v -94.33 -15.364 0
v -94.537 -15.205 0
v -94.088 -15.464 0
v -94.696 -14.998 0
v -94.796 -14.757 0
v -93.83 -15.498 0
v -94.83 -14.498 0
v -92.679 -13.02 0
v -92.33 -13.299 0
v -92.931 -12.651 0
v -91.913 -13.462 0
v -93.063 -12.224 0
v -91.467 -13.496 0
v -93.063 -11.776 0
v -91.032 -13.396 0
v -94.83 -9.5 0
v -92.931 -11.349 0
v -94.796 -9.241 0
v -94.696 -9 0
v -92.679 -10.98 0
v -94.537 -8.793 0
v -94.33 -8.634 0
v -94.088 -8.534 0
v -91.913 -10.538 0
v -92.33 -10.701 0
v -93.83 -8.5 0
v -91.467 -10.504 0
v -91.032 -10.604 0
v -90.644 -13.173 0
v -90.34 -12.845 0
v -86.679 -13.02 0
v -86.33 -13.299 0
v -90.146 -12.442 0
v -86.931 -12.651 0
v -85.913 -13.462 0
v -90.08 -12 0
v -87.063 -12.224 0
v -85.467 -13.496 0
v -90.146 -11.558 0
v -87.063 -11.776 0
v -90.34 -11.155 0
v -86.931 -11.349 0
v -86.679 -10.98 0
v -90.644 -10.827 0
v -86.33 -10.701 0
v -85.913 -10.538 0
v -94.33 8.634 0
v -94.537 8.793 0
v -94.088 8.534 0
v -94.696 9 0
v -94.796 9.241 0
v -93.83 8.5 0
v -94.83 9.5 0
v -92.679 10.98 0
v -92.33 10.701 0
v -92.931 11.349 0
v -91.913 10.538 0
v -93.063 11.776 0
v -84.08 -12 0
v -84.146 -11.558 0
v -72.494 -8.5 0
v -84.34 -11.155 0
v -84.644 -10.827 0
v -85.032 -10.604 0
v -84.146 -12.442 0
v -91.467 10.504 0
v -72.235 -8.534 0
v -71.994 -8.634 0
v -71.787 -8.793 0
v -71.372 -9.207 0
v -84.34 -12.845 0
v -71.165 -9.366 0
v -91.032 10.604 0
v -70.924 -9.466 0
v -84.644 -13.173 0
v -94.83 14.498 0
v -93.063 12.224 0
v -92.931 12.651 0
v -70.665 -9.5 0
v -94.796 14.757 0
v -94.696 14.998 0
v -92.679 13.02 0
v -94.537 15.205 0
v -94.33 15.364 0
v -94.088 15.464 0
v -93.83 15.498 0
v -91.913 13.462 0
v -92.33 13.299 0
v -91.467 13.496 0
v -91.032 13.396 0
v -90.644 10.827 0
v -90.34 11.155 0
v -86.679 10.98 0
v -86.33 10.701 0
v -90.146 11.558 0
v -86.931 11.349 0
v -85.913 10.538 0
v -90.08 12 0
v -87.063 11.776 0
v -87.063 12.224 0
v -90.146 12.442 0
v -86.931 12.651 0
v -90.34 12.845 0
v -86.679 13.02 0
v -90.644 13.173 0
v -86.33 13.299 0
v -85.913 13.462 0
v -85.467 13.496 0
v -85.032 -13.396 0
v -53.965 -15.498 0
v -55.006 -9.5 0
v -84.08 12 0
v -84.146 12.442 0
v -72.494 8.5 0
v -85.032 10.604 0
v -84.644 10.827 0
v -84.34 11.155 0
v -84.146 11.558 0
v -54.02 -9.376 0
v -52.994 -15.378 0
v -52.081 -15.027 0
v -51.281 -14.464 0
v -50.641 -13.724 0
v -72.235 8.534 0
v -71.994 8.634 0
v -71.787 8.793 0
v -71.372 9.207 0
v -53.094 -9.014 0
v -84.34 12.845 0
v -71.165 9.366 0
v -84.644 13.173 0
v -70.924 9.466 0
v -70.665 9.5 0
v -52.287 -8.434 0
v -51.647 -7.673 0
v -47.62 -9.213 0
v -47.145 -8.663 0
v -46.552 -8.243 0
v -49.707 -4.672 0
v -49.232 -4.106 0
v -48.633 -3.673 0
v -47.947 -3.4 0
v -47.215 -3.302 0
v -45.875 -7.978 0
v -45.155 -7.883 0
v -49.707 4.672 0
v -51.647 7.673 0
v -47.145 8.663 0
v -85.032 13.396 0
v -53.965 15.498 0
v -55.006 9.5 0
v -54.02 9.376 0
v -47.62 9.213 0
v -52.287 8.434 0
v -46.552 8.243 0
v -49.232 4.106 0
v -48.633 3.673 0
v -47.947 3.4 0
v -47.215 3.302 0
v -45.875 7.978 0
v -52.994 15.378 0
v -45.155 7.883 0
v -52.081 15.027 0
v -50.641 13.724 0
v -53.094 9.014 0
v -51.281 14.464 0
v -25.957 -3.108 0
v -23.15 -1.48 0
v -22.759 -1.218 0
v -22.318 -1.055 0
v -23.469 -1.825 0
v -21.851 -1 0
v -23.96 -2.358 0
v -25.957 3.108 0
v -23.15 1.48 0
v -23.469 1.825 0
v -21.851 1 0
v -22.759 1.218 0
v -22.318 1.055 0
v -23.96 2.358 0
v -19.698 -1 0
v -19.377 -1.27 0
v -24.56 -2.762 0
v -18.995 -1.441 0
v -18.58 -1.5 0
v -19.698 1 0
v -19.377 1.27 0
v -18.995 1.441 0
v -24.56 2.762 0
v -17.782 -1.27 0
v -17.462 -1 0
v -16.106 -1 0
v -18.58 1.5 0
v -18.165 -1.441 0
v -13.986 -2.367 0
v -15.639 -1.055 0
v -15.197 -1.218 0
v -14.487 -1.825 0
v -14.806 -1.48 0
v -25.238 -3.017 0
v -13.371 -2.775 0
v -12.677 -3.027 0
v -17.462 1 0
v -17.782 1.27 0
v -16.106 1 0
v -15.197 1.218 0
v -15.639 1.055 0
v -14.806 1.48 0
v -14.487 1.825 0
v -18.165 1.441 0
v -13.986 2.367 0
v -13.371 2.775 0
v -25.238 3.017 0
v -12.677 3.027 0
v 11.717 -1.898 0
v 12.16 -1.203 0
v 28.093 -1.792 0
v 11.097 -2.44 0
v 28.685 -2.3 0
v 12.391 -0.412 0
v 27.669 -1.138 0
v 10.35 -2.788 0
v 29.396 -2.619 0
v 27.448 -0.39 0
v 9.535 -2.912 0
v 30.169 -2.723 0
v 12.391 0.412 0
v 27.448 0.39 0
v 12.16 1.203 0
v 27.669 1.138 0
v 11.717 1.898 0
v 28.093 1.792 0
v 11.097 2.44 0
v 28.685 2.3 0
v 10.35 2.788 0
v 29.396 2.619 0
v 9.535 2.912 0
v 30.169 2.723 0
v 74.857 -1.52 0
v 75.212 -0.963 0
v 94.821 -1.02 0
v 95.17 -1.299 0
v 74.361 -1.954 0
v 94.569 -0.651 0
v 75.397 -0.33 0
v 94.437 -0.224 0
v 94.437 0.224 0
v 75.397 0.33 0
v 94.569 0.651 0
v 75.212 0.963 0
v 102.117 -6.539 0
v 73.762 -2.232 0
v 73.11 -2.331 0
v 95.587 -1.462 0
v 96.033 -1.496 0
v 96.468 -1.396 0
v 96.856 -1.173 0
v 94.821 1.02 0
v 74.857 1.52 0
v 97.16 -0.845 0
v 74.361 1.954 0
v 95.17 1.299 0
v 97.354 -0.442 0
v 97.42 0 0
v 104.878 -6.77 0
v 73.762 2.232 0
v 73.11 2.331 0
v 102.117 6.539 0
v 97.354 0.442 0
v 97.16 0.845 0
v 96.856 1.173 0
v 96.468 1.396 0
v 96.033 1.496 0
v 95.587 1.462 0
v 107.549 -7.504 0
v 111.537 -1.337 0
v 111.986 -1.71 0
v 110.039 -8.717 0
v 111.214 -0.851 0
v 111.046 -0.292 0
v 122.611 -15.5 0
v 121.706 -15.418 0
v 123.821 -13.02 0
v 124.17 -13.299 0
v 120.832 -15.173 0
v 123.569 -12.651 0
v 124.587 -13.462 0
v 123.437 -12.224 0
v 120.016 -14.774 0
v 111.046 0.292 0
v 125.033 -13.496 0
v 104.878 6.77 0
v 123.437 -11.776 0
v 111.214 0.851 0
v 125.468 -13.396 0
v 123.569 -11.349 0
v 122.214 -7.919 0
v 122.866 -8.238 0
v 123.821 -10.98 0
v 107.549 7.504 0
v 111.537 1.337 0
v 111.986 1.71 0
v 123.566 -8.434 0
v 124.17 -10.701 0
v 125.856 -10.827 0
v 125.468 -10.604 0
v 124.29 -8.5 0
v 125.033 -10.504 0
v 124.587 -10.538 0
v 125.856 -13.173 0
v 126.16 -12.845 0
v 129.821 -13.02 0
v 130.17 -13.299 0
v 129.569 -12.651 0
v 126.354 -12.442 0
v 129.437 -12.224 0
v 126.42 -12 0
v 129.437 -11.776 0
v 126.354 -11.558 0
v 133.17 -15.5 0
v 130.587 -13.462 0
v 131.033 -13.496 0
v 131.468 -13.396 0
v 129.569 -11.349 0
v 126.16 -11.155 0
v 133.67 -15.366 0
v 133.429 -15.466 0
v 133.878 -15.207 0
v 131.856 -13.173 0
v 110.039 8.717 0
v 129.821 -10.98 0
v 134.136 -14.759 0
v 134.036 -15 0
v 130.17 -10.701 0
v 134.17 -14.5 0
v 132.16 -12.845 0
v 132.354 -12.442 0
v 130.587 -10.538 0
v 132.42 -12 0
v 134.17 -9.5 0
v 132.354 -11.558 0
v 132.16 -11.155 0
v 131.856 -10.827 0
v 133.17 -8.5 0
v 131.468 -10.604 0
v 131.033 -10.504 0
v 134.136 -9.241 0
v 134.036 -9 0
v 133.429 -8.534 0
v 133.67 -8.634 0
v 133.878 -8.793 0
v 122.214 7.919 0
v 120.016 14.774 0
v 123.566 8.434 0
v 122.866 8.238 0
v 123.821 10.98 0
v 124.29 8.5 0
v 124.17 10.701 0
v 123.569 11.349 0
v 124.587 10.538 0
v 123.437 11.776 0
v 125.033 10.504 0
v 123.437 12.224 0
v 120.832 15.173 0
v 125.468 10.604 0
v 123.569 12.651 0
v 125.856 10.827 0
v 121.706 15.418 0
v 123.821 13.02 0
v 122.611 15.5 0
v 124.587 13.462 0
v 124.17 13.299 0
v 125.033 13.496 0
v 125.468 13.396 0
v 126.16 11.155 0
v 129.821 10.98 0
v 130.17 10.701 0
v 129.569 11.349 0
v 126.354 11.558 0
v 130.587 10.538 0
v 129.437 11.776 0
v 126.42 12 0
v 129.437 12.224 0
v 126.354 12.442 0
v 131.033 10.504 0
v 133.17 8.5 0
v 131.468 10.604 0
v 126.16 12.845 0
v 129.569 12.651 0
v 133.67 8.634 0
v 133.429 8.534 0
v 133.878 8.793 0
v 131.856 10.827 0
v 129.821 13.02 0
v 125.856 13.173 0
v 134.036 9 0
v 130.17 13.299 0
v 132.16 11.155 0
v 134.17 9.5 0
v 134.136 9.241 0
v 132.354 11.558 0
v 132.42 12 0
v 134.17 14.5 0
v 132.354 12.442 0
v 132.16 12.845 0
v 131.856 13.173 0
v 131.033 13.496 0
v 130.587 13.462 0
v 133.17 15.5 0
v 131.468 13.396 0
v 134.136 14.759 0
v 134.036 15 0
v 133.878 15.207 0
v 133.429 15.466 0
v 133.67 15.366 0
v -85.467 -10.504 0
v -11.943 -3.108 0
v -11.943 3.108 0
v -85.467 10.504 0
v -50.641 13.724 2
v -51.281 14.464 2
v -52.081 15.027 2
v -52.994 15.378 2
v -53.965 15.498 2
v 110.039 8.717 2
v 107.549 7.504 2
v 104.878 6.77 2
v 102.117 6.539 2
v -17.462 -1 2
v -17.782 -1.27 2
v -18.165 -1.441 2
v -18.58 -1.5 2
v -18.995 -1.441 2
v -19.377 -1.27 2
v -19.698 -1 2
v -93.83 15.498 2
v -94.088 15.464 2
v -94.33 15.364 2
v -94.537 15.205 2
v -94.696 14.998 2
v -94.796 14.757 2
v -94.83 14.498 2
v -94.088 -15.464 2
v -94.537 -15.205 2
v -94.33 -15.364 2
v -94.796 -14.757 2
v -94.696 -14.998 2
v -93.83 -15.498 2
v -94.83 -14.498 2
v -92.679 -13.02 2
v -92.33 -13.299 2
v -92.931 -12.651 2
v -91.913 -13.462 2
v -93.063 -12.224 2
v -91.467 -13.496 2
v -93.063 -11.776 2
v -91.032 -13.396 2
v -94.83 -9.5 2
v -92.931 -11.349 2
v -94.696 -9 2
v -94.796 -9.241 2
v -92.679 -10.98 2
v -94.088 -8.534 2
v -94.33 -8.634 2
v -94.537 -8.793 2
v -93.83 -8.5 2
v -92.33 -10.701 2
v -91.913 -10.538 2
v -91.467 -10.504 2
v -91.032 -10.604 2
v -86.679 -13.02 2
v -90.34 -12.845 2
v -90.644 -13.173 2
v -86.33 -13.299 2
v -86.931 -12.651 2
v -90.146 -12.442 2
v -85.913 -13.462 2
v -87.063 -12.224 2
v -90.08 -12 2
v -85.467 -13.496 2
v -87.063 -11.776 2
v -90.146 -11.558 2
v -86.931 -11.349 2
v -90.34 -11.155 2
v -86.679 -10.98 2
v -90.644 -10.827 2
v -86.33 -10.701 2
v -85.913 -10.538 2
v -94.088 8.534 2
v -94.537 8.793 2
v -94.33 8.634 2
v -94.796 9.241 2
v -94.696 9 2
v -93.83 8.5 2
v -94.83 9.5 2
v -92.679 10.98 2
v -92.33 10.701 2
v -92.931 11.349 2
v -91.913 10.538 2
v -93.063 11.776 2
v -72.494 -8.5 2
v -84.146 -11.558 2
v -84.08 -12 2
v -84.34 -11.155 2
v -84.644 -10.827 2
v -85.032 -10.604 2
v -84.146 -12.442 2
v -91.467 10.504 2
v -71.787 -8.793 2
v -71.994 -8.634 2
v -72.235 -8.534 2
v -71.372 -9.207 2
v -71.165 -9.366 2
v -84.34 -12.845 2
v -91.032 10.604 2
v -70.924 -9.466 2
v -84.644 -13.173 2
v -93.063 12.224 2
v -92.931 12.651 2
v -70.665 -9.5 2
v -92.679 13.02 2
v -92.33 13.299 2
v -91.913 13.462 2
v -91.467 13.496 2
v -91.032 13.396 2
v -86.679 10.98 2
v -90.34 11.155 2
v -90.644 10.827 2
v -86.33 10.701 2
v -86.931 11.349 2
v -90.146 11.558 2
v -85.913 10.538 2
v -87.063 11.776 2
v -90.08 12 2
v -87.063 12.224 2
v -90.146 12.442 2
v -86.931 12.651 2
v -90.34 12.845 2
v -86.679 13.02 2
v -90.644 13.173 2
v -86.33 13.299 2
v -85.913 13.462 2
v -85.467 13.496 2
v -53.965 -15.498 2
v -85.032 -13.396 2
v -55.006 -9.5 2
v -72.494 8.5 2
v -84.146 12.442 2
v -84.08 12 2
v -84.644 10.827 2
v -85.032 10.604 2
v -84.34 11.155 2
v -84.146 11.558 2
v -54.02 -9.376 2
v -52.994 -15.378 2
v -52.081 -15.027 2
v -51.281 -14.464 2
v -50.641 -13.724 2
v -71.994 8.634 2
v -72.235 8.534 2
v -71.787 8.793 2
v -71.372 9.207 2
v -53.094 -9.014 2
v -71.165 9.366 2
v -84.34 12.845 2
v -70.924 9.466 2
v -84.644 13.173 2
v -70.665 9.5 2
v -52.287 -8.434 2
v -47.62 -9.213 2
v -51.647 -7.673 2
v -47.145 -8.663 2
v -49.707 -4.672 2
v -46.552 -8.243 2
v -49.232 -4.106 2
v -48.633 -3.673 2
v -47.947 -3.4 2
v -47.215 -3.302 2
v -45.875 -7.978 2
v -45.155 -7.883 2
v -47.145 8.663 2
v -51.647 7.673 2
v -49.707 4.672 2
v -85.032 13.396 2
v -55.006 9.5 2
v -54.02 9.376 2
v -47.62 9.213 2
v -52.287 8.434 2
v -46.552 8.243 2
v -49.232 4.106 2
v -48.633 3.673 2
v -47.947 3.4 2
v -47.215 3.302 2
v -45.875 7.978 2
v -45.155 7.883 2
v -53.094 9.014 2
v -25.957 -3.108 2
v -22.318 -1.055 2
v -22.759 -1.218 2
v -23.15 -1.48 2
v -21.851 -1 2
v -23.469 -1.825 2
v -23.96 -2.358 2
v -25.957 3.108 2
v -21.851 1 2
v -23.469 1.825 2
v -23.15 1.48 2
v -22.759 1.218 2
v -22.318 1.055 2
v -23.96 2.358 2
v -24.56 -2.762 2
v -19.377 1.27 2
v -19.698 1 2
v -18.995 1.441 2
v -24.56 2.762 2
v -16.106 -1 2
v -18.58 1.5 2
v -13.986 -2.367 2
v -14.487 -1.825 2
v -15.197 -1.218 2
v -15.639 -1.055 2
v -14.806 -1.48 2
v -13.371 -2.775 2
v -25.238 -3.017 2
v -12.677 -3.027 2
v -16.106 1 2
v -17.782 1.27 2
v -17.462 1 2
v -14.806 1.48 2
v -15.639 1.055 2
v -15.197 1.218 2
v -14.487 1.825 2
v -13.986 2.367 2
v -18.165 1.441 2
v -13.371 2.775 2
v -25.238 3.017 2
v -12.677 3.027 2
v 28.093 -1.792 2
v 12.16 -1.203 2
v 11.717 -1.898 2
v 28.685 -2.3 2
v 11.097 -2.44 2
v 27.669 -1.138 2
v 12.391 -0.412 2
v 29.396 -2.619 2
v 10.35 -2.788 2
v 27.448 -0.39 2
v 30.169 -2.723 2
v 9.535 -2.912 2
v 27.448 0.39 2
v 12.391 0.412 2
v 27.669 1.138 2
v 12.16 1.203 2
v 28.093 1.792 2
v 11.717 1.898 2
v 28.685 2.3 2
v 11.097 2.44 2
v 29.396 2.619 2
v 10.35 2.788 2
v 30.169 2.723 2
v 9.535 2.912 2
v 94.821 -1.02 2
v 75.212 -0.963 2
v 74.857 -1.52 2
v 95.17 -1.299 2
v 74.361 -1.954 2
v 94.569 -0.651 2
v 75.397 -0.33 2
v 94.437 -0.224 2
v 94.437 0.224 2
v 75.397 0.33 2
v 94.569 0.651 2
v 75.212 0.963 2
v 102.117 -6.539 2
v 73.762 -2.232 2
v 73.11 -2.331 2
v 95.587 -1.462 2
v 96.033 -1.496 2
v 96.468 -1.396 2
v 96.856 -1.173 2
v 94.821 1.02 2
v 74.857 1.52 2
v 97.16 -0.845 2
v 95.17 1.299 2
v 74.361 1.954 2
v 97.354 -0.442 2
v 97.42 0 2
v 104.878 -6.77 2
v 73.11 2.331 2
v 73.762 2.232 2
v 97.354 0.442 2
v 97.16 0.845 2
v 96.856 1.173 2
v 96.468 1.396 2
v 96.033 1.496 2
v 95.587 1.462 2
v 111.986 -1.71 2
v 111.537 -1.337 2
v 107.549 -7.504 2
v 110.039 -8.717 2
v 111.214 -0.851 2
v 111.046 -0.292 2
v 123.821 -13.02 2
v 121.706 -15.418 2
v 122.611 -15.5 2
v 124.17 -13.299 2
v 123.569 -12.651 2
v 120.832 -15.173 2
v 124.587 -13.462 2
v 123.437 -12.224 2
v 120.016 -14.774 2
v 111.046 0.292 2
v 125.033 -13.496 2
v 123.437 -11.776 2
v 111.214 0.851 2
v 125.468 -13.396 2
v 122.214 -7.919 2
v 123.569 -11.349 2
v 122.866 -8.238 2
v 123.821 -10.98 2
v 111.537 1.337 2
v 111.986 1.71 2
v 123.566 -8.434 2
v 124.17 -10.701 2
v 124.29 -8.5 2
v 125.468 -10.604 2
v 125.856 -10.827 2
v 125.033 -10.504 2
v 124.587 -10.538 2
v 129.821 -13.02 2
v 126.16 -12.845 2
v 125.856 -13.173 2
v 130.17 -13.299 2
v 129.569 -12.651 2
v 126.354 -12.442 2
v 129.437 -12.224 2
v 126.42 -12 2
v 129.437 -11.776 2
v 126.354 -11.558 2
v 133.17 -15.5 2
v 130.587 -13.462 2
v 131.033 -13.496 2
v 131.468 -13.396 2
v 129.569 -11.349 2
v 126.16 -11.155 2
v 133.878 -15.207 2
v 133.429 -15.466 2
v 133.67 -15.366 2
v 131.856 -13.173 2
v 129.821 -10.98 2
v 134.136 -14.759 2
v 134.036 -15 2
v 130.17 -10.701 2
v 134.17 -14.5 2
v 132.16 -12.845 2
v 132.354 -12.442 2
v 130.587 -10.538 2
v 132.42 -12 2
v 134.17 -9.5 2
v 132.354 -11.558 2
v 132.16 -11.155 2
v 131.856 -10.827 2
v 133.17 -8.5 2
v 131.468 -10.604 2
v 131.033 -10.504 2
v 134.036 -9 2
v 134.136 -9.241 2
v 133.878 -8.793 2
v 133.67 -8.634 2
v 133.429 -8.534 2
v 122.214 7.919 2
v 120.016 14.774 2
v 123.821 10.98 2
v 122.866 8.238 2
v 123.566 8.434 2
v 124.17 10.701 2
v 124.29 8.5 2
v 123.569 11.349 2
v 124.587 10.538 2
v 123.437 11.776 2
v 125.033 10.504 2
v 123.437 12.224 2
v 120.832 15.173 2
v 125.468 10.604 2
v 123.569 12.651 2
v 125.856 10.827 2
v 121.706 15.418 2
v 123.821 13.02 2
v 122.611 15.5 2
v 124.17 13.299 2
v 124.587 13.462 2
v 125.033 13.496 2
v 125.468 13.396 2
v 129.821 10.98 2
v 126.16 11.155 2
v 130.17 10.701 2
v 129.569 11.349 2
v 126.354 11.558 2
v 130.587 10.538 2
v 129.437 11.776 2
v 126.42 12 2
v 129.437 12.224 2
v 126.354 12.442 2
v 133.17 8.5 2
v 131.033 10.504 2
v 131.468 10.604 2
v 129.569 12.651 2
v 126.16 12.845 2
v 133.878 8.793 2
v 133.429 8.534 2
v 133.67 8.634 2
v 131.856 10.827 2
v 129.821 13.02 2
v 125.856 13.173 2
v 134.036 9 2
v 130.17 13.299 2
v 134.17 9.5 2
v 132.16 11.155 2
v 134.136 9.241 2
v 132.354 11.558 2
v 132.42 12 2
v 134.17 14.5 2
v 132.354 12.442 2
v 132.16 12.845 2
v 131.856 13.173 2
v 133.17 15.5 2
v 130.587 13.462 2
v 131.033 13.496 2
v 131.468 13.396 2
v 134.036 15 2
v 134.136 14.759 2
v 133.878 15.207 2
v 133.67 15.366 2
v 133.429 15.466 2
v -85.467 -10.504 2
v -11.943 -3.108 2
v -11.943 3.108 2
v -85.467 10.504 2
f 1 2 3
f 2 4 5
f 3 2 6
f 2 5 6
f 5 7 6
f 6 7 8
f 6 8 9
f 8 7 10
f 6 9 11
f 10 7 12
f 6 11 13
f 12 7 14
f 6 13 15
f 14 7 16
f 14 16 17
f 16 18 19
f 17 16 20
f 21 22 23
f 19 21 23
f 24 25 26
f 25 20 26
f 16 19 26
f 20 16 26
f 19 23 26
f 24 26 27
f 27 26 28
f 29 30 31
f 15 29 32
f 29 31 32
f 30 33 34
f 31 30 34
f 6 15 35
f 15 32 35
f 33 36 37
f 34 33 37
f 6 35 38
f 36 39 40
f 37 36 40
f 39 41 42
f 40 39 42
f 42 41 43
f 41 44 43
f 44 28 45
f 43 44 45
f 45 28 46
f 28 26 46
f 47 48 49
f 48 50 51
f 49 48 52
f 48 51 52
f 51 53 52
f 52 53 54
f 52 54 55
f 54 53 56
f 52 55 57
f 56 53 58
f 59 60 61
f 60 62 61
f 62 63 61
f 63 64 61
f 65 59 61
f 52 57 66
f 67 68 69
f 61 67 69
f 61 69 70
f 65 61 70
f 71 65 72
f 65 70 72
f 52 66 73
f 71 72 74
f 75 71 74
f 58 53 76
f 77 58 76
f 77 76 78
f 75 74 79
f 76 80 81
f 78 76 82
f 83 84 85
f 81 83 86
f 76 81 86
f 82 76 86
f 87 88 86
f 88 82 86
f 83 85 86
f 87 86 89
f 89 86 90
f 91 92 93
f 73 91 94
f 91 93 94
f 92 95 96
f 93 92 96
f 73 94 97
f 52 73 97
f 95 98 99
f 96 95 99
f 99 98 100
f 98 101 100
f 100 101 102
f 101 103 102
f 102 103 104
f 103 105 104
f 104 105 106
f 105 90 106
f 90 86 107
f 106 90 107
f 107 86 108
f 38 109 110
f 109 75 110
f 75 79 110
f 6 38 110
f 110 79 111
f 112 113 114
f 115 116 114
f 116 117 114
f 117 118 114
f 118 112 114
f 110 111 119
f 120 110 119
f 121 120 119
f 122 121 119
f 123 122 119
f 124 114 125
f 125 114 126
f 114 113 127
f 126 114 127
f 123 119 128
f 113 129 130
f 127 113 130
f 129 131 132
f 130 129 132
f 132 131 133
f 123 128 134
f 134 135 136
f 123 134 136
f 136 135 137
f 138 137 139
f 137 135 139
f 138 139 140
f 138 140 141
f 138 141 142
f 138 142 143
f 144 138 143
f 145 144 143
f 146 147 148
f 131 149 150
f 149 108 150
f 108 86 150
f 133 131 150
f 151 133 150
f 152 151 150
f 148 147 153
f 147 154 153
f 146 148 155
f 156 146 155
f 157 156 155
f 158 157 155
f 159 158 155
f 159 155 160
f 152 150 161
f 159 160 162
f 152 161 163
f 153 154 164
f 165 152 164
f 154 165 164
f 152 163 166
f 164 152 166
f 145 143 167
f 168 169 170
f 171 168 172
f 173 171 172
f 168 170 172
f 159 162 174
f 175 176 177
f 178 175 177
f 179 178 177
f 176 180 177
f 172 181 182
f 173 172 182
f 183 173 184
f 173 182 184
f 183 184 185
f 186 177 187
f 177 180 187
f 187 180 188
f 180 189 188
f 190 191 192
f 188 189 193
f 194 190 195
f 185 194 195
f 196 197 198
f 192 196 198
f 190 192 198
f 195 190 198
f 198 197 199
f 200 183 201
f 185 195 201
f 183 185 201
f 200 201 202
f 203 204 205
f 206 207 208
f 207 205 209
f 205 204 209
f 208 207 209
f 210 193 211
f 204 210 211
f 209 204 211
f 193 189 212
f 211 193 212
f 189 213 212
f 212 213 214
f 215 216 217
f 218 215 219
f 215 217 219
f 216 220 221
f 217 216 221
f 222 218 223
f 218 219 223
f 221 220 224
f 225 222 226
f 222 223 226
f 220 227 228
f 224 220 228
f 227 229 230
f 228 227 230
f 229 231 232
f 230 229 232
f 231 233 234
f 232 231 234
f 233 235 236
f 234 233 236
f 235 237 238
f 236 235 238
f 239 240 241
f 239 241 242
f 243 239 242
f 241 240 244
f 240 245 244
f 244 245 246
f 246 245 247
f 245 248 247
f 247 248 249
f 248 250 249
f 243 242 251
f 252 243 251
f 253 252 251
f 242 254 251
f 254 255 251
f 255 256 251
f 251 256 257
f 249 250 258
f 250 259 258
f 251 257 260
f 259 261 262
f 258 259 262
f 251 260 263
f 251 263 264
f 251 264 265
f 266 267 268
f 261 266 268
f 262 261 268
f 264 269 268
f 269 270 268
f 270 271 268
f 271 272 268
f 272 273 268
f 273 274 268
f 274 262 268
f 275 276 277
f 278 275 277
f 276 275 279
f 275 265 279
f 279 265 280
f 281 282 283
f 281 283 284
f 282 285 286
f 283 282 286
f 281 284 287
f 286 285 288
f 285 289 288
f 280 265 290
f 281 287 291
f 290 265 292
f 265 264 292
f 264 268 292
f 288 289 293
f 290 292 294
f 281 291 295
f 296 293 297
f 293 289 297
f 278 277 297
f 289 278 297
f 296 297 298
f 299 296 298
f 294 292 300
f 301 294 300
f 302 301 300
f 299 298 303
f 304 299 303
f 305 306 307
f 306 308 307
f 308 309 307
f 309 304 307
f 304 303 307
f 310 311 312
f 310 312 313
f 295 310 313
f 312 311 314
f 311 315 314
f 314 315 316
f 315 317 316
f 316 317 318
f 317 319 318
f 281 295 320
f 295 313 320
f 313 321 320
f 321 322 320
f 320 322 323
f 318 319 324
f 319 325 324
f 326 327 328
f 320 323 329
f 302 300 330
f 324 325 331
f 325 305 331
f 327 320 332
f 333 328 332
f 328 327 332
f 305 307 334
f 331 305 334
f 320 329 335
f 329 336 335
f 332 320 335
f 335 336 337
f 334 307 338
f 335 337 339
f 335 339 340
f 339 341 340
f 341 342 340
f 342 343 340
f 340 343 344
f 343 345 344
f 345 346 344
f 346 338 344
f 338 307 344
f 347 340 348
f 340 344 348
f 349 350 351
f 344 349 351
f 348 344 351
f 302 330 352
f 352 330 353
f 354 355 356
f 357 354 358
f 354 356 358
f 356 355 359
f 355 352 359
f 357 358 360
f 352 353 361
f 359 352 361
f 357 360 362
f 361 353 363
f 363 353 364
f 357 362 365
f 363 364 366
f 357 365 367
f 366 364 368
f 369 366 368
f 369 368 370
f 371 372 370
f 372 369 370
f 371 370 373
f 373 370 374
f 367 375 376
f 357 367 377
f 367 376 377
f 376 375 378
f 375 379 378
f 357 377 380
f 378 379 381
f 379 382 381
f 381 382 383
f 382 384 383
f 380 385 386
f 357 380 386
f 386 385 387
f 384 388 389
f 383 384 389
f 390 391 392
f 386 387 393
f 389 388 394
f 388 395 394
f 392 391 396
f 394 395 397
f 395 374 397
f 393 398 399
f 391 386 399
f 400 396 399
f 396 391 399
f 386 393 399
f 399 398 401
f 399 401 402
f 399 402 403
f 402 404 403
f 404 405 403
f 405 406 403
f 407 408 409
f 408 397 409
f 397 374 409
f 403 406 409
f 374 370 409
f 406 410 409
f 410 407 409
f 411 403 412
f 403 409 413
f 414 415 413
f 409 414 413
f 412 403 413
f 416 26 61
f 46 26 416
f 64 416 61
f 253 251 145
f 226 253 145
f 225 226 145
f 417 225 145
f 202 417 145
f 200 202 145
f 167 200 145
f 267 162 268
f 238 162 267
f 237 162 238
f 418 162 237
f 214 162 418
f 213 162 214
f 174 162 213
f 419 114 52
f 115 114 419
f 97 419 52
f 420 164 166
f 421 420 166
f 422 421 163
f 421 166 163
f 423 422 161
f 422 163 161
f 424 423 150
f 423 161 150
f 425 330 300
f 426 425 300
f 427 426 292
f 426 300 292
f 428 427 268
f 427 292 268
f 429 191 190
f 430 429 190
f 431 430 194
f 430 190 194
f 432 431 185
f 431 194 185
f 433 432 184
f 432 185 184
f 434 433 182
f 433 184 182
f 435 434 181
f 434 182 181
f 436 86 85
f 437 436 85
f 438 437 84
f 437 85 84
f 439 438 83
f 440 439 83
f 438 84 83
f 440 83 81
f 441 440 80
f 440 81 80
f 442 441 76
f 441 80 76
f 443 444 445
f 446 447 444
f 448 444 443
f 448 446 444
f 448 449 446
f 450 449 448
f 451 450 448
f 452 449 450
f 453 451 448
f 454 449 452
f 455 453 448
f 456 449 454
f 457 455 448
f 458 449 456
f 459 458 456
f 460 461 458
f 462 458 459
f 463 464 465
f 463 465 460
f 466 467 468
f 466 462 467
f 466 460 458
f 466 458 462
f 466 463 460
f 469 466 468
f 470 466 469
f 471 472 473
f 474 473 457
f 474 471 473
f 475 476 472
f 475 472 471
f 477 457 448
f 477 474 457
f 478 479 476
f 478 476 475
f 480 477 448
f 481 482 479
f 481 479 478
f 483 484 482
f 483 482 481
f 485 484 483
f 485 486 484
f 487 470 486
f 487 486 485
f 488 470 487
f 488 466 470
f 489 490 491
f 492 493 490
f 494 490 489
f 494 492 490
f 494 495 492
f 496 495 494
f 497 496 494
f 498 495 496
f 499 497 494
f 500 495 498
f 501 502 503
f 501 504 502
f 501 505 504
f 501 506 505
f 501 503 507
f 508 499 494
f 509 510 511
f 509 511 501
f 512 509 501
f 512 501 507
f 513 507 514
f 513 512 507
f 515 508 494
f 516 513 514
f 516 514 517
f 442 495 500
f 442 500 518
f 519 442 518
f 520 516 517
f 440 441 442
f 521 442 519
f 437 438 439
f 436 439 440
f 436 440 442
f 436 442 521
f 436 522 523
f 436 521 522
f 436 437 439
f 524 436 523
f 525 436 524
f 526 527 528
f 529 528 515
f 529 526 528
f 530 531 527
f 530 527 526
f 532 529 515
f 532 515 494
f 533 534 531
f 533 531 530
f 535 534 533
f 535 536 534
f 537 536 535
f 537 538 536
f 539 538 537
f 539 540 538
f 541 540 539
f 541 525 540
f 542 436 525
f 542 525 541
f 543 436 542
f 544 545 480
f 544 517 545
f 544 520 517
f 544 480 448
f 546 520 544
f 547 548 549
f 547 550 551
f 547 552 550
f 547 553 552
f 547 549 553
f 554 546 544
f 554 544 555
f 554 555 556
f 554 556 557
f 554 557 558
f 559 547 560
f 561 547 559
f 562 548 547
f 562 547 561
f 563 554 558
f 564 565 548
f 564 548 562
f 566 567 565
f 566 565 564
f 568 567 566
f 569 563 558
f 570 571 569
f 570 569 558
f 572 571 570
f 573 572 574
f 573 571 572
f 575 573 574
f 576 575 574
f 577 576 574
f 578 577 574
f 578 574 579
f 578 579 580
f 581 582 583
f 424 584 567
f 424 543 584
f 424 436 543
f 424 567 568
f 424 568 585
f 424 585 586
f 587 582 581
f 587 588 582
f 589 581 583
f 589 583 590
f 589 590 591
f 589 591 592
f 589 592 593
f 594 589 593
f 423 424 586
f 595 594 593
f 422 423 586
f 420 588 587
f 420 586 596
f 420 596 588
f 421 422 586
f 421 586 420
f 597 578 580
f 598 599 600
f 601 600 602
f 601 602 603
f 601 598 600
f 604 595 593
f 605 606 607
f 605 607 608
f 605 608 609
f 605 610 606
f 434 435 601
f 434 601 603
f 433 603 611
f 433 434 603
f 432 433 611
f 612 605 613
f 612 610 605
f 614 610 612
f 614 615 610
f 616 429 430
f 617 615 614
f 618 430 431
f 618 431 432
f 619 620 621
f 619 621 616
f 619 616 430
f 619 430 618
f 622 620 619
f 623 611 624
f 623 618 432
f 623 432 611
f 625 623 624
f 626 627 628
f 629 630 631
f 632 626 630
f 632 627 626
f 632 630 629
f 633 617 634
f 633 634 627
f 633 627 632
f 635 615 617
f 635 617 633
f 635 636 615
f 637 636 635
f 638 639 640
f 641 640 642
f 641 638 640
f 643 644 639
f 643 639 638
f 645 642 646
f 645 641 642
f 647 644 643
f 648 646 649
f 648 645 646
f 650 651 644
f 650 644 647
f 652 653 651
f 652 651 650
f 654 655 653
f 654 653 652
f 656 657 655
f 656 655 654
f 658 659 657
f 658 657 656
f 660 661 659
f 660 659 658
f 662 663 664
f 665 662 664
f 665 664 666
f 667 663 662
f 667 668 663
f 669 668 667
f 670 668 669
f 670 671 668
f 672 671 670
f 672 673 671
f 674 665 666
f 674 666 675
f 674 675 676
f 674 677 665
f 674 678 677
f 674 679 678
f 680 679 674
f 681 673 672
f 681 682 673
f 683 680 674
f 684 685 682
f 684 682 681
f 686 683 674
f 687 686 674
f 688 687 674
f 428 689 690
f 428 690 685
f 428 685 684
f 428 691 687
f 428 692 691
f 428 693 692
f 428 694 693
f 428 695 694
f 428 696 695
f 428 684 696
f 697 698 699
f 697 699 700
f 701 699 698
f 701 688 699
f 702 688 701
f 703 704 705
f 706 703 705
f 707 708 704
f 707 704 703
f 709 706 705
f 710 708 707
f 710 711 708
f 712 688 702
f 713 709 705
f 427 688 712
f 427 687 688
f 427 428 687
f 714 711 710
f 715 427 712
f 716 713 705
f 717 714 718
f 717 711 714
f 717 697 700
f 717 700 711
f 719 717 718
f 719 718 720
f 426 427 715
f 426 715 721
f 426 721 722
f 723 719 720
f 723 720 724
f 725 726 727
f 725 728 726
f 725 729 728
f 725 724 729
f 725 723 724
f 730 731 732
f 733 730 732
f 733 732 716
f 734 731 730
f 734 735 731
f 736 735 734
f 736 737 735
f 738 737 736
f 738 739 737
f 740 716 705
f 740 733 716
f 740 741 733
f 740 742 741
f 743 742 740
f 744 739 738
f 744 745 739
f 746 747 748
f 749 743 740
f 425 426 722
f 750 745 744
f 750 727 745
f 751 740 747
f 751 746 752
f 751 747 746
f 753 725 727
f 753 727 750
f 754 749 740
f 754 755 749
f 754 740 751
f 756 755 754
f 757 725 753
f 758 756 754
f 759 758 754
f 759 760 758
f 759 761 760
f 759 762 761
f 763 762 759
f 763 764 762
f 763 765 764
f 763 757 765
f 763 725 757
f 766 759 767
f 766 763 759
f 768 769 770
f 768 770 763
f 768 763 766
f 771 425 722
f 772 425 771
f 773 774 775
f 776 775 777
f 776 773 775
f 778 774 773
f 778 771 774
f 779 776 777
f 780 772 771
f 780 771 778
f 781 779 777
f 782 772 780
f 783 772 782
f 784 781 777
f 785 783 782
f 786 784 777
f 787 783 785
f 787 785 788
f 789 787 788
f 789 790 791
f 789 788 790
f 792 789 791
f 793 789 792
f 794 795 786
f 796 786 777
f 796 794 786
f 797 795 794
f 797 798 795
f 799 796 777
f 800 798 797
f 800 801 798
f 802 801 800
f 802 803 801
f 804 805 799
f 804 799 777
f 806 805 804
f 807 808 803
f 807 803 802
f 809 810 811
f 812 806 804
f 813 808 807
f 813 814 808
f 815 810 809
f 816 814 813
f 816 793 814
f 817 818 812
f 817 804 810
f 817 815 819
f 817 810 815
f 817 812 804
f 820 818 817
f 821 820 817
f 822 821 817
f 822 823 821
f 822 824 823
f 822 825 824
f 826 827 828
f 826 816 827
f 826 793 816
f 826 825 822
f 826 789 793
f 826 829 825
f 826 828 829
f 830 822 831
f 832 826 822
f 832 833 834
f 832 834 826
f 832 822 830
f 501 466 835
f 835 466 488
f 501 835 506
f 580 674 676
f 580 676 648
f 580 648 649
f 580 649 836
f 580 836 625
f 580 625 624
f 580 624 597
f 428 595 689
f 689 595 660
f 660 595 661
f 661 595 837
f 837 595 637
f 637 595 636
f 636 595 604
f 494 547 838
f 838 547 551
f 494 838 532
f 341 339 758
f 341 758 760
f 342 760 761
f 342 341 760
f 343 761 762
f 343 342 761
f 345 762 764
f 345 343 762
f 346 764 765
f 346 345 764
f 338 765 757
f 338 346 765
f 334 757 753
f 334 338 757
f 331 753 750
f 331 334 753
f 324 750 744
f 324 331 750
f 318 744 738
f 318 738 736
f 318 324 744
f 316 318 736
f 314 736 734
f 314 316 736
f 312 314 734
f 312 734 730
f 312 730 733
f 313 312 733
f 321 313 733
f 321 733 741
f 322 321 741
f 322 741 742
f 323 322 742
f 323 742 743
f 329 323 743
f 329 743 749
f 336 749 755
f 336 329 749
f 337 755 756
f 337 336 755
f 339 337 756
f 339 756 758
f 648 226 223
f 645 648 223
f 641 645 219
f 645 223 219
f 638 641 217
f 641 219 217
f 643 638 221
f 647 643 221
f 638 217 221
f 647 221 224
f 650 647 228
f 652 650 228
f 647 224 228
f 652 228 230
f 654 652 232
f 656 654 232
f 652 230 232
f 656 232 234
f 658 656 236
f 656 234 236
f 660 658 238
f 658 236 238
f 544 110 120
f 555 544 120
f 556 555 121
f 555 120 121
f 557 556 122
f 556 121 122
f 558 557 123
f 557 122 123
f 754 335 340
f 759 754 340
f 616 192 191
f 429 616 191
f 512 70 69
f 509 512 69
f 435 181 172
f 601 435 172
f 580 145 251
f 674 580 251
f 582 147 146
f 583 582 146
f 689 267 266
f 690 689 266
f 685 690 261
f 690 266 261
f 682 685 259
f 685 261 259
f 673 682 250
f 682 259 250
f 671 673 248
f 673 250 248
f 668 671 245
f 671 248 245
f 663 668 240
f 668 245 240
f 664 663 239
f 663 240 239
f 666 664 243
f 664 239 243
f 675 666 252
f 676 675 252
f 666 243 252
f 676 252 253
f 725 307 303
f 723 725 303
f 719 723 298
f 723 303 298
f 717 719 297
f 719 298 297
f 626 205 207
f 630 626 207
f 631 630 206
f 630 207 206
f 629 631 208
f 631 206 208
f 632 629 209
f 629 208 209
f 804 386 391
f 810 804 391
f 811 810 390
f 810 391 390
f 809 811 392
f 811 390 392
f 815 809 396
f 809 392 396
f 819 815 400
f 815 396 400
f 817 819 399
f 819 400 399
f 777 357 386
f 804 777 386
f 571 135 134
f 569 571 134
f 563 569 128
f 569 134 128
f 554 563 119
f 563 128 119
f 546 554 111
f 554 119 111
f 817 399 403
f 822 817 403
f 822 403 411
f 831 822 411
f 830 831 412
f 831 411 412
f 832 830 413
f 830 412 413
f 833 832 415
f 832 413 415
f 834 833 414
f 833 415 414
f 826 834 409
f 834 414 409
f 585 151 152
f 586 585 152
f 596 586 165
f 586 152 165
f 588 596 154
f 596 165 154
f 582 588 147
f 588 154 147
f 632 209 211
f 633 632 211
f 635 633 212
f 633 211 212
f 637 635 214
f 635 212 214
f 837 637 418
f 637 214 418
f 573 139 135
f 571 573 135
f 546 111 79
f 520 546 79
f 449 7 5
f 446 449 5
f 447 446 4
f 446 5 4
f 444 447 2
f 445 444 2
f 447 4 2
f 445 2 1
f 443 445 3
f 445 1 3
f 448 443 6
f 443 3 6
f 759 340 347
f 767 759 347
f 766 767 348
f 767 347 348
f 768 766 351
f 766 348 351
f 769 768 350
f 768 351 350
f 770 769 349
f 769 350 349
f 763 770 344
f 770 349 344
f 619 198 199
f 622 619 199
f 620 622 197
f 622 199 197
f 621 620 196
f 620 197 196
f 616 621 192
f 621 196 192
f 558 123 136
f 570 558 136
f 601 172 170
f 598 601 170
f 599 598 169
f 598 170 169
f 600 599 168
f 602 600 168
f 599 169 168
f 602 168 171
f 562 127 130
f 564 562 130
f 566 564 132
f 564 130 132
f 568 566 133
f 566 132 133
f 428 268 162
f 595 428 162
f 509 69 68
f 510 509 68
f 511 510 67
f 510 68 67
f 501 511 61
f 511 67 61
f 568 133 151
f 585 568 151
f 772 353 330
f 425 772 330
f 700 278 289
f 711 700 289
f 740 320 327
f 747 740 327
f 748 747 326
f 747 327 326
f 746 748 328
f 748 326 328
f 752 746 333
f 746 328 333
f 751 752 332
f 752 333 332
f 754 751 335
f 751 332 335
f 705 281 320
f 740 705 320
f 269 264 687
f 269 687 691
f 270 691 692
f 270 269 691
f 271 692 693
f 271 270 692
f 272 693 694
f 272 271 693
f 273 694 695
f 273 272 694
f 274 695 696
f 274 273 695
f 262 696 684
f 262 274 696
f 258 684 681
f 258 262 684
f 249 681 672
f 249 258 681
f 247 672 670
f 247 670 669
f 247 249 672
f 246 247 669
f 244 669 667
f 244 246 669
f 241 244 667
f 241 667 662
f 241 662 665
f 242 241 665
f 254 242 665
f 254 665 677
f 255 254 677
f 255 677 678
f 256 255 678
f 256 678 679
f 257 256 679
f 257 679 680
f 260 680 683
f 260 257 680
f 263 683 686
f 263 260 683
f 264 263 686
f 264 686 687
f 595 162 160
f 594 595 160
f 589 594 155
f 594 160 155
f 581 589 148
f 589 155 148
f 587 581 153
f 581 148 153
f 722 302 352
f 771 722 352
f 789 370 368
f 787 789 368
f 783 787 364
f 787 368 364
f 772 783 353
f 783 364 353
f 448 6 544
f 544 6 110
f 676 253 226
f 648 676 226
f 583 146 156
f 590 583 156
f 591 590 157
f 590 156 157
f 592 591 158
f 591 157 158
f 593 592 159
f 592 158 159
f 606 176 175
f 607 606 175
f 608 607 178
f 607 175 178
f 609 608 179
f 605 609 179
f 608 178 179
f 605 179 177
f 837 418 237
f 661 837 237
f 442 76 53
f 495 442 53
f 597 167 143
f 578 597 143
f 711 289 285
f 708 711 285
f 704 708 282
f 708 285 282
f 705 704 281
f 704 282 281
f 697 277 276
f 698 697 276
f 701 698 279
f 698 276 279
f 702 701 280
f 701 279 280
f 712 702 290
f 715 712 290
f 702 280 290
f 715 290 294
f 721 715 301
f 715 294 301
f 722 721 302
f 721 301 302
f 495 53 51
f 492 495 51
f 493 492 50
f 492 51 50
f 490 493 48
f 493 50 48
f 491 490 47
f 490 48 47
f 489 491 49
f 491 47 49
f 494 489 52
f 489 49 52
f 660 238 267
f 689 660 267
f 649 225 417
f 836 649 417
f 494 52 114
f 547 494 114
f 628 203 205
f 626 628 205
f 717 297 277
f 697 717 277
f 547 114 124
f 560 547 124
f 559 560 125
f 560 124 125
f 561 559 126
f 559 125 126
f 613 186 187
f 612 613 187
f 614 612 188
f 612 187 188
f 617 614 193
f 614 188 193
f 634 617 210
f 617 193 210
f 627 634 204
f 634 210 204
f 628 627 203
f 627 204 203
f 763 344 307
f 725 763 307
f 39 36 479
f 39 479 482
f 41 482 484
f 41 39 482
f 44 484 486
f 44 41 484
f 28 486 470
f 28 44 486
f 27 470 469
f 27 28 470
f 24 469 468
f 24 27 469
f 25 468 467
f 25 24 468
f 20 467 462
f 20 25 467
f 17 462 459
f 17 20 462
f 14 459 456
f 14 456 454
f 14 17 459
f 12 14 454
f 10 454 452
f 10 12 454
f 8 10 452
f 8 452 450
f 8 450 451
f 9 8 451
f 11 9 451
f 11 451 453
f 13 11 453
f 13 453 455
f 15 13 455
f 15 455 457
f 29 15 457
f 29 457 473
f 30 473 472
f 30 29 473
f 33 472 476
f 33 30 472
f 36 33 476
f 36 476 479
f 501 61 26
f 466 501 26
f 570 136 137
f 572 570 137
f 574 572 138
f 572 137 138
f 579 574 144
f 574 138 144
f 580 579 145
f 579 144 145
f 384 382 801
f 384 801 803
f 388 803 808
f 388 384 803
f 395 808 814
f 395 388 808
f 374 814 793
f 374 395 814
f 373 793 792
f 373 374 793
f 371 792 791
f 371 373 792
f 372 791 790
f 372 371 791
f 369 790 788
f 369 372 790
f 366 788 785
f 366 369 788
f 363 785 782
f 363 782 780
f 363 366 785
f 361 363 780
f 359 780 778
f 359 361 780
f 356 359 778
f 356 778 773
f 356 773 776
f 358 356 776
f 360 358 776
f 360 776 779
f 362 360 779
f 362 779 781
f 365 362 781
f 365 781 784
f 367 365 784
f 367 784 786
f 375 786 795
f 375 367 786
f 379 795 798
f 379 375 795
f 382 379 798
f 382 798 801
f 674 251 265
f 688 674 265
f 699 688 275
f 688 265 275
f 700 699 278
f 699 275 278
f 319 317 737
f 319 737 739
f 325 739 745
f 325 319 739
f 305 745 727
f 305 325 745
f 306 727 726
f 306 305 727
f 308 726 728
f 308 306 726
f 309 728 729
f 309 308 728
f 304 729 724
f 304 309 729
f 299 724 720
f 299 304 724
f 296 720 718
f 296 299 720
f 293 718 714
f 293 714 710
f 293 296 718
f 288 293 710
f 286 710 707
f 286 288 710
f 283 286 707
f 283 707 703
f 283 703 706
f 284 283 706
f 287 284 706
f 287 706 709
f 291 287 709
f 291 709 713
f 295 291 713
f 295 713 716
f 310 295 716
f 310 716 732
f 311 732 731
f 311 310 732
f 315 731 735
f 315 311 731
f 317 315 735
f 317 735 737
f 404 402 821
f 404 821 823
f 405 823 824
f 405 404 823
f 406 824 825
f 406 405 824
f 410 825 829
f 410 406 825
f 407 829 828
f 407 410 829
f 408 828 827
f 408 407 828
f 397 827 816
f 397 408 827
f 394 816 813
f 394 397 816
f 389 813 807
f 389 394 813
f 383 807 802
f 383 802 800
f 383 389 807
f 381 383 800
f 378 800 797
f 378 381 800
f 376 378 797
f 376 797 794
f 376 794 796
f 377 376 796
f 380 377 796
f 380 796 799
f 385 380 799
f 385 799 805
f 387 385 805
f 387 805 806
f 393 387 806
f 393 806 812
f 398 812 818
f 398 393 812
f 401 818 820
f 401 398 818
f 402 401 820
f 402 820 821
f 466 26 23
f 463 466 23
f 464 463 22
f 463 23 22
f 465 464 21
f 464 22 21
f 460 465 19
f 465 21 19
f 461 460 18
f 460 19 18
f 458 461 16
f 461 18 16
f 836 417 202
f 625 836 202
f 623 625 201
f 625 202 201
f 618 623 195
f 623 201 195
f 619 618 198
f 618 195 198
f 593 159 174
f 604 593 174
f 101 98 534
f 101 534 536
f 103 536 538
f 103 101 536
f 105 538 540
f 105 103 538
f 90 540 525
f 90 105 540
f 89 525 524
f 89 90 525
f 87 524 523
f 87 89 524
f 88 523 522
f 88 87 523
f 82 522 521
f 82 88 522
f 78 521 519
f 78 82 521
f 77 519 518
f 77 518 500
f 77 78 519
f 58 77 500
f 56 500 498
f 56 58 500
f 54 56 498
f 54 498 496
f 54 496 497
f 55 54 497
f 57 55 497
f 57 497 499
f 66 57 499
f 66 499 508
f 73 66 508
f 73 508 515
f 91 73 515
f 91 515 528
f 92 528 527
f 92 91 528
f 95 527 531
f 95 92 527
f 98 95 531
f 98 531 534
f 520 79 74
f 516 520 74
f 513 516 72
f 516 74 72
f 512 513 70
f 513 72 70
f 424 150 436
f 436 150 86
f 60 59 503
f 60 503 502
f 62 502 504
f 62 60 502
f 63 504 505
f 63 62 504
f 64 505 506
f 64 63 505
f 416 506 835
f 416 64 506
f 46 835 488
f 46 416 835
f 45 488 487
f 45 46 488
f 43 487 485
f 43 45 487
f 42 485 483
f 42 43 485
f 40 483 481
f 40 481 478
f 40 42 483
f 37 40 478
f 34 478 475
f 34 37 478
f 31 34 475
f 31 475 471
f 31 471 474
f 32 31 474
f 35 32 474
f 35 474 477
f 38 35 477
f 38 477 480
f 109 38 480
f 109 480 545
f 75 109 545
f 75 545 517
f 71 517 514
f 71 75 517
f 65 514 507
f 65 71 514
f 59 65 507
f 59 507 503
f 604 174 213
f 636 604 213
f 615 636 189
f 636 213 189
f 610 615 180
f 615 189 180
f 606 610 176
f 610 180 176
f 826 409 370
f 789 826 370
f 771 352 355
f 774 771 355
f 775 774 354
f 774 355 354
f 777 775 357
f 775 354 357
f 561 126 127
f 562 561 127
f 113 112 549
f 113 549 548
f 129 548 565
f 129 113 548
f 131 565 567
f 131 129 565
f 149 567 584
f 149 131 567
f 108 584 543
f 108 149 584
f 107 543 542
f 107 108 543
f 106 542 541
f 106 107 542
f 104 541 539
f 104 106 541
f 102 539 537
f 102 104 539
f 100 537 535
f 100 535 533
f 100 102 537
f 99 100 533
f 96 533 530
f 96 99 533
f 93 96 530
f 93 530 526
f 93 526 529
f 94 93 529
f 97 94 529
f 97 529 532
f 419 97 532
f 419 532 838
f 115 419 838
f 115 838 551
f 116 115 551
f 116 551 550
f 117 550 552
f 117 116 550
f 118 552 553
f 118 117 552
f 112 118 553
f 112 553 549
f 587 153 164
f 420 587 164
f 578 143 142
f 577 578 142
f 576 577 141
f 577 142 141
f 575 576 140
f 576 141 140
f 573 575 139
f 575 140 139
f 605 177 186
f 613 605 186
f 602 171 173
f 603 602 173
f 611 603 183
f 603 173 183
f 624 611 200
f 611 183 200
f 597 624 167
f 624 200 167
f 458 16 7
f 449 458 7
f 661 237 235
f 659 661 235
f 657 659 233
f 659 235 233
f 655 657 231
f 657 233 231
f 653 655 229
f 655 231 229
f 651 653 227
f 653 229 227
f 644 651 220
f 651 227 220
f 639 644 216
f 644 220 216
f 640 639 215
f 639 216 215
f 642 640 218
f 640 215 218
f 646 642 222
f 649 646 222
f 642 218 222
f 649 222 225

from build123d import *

# Parameters (mm, degrees)
F0_R     = 1.5
F1_DEPTH = 2


with BuildPart() as f1:
    # F0 (on Top) → F1 (new body)
    with BuildSketch(Plane.XY):
        with BuildLine():
            ThreePointArc((-19.697627, 1), (-18.579593, 1.5), (-17.461559, 1))
            Line((-17.461559, 1), (-16.105791, 1))
            ThreePointArc((-16.105791, 1), (-15.197296, 1.218249), (-14.487079, 1.825363))
            ThreePointArc((-14.487079, 1.825363), (-13.370764, 2.775222), (-11.943263, 3.107833))
            Line((-11.943263, 3.107833), (9.535083, 2.911781))
            ThreePointArc((9.535083, 2.911781), (12.420407, 0), (9.535083, -2.911781))
            Line((9.535083, -2.911781), (-11.943263, -3.107833))
            ThreePointArc((-11.943263, -3.107833), (-13.370764, -2.775222), (-14.487079, -1.825363))
            ThreePointArc((-14.487079, -1.825363), (-15.197296, -1.218249), (-16.105791, -1))
            Line((-16.105791, -1), (-17.461559, -1))
            ThreePointArc((-17.461559, -1), (-18.579593, -1.5), (-19.697627, -1))
            Line((-19.697627, -1), (-21.850744, -1))
            ThreePointArc((-21.850744, -1), (-22.759239, -1.218249), (-23.469456, -1.825363))
            ThreePointArc((-23.469456, -1.825363), (-24.560498, -2.762335), (-25.956535, -3.107833))
            Line((-25.956535, -3.107833), (-47.215056, -3.301877))
            ThreePointArc((-47.215056, -3.301877), (-48.633493, -3.67314), (-49.706572, -4.67229))
            Line((-49.706572, -4.67229), (-51.647468, -7.672617))
            ThreePointArc((-51.647468, -7.672617), (-53.094256, -9.013578), (-55.006, -9.5))
            Line((-55.006, -9.5), (-70.66538, -9.5))
            ThreePointArc((-70.66538, -9.5), (-71.048063, -9.42388), (-71.372486, -9.207107))
            Line((-71.372486, -9.207107), (-71.7867, -8.792893))
            ThreePointArc((-71.7867, -8.792893), (-72.111123, -8.57612), (-72.493807, -8.5))
            Line((-72.493807, -8.5), (-93.829593, -8.5))
            ThreePointArc((-93.829593, -8.5), (-94.5367, -8.792893), (-94.829593, -9.5))
            Line((-94.829593, -9.5), (-94.829593, -14.497718))
            ThreePointArc((-94.829593, -14.497718), (-94.5367, -15.204825), (-93.829593, -15.497718))
            Line((-93.829593, -15.497718), (-53.964611, -15.497718))
            ThreePointArc((-53.964611, -15.497718), (-52.081116, -15.02652), (-50.64137, -13.72394))
            Line((-50.64137, -13.72394), (-47.61983, -9.213471))
            ThreePointArc((-47.61983, -9.213471), (-46.552084, -8.243011), (-45.154781, -7.883263))
            Line((-45.154781, -7.883263), (102.117442, -6.538983))
            ThreePointArc((102.117442, -6.538983), (106.230219, -7.07487), (110.039026, -8.716546))
            Line((110.039026, -8.716546), (120.015907, -14.773938))
            ThreePointArc((120.015907, -14.773938), (121.26352, -15.315064), (122.610798, -15.5))
            Line((122.610798, -15.5), (133.170407, -15.5))
            ThreePointArc((133.170407, -15.5), (133.877514, -15.207107), (134.170407, -14.5))
            Line((134.170407, -14.5), (134.170407, -9.5))
            ThreePointArc((134.170407, -9.5), (133.877514, -8.792893), (133.170407, -8.5))
            Line((133.170407, -8.5), (124.289625, -8.5))
            ThreePointArc((124.289625, -8.5), (123.211804, -8.352051), (122.213713, -7.91915))
            Line((122.213713, -7.91915), (111.986177, -1.709575))
            ThreePointArc((111.986177, -1.709575), (111.024134, 0), (111.986177, 1.709575))
            Line((111.986177, 1.709575), (122.213713, 7.91915))
            ThreePointArc((122.213713, 7.91915), (123.211804, 8.352051), (124.289625, 8.5))
            Line((124.289625, 8.5), (133.170407, 8.5))
            ThreePointArc((133.170407, 8.5), (133.877514, 8.792893), (134.170407, 9.5))
            Line((134.170407, 9.5), (134.170407, 14.5))
            ThreePointArc((134.170407, 14.5), (133.877514, 15.207107), (133.170407, 15.5))
            Line((133.170407, 15.5), (122.610798, 15.5))
            ThreePointArc((122.610798, 15.5), (121.26352, 15.315064), (120.015907, 14.773938))
            Line((120.015907, 14.773938), (110.039026, 8.716546))
            ThreePointArc((110.039026, 8.716546), (106.230219, 7.07487), (102.117442, 6.538983))
            Line((102.117442, 6.538983), (-45.154781, 7.883263))
            ThreePointArc((-45.154781, 7.883263), (-46.552084, 8.243011), (-47.61983, 9.213471))
            Line((-47.61983, 9.213471), (-50.64137, 13.72394))
            ThreePointArc((-50.64137, 13.72394), (-52.081116, 15.02652), (-53.964611, 15.497718))
            Line((-53.964611, 15.497718), (-93.829593, 15.497718))
            ThreePointArc((-93.829593, 15.497718), (-94.5367, 15.204825), (-94.829593, 14.497718))
            Line((-94.829593, 14.497718), (-94.829593, 9.5))
            ThreePointArc((-94.829593, 9.5), (-94.5367, 8.792893), (-93.829593, 8.5))
            Line((-93.829593, 8.5), (-72.493807, 8.5))
            ThreePointArc((-72.493807, 8.5), (-72.111123, 8.57612), (-71.7867, 8.792893))
            Line((-71.7867, 8.792893), (-71.372486, 9.207107))
            ThreePointArc((-71.372486, 9.207107), (-71.048063, 9.42388), (-70.66538, 9.5))
            Line((-70.66538, 9.5), (-55.006, 9.5))
            ThreePointArc((-55.006, 9.5), (-53.094256, 9.013578), (-51.647468, 7.672617))
            Line((-51.647468, 7.672617), (-49.706572, 4.67229))
            ThreePointArc((-49.706572, 4.67229), (-48.633493, 3.67314), (-47.215056, 3.301877))
            Line((-47.215056, 3.301877), (-25.956535, 3.107833))
            ThreePointArc((-25.956535, 3.107833), (-24.560498, 2.762335), (-23.469456, 1.825363))
            ThreePointArc((-23.469456, 1.825363), (-22.759239, 1.218249), (-21.850744, 1))
            Line((-21.850744, 1), (-19.697627, 1))
        make_face()
        with Locations((-91.579593, -12)):
            Circle(F0_R, mode=Mode.SUBTRACT)
        with Locations((-85.579593, -12)):
            Circle(F0_R, mode=Mode.SUBTRACT)
        with Locations((124.920407, -12)):
            Circle(F0_R, mode=Mode.SUBTRACT)
        with Locations((130.920407, -12)):
            Circle(F0_R, mode=Mode.SUBTRACT)
        with Locations((-91.579593, 12)):
            Circle(F0_R, mode=Mode.SUBTRACT)
        with Locations((-85.579593, 12)):
            Circle(F0_R, mode=Mode.SUBTRACT)
        with BuildLine():
            ThreePointArc((73.110114, 2.331478), (75.420407, 0), (73.110114, -2.331478))
            Line((73.110114, -2.331478), (30.168819, -2.72344))
            ThreePointArc((30.168819, -2.72344), (27.420407, 0), (30.168819, 2.72344))
            Line((30.168819, 2.72344), (73.110114, 2.331478))
        make_face(mode=Mode.SUBTRACT)
        with Locations((95.920407, 0)):
            Circle(F0_R, mode=Mode.SUBTRACT)
        with Locations((124.920407, 12)):
            Circle(F0_R, mode=Mode.SUBTRACT)
        with Locations((130.920407, 12)):
            Circle(F0_R, mode=Mode.SUBTRACT)
    extrude(amount=F1_DEPTH)


solid = f1.part
